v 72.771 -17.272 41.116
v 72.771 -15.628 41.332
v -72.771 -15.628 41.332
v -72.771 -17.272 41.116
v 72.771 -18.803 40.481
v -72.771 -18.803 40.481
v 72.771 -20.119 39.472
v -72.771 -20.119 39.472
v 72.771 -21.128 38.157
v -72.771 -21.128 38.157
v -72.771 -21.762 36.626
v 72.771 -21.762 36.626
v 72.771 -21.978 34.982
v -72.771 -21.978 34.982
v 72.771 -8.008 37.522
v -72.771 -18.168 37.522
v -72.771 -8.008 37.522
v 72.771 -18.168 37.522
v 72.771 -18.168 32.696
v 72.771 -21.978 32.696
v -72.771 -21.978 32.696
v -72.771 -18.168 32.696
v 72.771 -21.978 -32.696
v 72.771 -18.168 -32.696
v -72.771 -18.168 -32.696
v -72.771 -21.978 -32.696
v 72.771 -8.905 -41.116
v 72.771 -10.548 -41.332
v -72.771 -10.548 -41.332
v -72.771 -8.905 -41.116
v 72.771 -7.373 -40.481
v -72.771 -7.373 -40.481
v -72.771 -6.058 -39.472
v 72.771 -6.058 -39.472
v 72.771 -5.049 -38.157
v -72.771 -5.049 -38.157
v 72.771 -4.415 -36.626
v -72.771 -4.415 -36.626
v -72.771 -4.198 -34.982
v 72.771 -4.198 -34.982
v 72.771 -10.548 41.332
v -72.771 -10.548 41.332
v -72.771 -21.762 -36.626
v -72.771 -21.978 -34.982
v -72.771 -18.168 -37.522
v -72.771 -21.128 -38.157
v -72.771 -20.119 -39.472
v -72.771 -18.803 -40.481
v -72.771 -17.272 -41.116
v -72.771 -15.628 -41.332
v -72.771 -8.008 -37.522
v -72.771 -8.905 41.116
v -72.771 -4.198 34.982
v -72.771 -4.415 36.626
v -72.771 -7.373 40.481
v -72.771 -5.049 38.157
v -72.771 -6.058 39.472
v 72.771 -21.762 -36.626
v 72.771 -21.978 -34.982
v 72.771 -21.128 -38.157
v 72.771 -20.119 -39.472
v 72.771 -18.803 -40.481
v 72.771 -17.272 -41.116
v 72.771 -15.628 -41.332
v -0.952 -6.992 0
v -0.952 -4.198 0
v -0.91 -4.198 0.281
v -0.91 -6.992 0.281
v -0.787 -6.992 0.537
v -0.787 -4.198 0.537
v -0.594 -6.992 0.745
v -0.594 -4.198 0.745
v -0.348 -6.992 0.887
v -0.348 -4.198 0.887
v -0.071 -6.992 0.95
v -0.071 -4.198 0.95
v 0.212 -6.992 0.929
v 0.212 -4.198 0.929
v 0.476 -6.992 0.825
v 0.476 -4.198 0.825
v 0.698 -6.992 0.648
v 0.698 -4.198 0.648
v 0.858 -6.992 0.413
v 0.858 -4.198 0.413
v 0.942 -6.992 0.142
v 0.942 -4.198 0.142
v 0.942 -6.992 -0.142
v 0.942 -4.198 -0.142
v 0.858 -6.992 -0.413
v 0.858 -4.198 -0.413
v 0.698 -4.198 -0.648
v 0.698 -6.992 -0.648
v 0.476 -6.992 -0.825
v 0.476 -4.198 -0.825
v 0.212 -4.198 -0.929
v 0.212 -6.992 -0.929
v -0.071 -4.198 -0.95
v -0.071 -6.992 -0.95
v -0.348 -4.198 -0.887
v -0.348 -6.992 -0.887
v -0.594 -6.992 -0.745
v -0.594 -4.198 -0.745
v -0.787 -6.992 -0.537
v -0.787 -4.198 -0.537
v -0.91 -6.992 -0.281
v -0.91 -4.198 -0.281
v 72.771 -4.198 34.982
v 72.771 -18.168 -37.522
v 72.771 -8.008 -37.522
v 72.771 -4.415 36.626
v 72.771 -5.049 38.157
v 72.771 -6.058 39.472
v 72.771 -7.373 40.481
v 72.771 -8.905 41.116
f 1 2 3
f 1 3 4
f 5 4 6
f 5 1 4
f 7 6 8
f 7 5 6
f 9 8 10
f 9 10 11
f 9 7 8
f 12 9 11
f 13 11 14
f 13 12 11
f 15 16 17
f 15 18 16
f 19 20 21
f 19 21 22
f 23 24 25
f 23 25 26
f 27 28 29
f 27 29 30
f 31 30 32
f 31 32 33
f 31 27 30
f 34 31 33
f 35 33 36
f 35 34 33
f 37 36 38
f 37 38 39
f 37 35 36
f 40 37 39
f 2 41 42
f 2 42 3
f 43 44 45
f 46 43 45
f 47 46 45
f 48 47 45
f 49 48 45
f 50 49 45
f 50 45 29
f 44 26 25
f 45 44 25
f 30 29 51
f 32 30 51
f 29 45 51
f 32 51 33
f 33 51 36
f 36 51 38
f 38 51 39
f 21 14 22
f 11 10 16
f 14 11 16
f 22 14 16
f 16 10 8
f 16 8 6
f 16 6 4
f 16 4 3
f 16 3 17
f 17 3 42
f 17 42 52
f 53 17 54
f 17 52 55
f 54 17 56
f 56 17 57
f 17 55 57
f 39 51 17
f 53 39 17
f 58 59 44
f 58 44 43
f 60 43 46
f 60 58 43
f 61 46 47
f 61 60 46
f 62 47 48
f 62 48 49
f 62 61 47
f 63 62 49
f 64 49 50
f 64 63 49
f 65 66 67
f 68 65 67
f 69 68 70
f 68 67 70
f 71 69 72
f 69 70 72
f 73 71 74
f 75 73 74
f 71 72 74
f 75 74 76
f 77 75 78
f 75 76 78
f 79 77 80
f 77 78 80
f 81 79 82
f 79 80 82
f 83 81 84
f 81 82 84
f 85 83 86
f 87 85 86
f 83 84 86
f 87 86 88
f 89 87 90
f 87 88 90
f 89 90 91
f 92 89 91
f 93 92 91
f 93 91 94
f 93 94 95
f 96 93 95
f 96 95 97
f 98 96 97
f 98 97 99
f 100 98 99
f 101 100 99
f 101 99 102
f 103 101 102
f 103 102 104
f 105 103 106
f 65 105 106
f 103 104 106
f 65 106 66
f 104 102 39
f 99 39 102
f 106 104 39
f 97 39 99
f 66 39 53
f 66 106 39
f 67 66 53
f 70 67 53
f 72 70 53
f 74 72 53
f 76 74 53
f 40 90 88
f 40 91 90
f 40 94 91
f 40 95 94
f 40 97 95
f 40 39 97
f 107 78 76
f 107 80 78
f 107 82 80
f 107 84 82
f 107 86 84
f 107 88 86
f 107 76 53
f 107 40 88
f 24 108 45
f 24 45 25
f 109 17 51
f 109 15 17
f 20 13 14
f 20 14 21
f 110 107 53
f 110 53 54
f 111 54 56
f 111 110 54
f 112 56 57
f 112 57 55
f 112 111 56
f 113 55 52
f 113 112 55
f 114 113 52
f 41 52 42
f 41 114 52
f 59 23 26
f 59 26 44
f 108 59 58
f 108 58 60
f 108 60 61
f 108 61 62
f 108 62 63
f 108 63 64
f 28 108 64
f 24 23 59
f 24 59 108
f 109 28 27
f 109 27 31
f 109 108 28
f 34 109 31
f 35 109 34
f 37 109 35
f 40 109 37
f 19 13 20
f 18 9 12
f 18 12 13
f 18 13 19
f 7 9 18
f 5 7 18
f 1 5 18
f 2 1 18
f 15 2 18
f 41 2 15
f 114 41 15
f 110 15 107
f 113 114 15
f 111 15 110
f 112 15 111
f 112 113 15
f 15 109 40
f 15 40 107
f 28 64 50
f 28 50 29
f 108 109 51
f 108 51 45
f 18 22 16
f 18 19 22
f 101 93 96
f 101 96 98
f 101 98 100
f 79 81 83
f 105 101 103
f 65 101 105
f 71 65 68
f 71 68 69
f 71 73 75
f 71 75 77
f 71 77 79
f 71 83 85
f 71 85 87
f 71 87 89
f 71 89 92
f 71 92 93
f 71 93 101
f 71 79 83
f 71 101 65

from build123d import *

# Parameters (mm, degrees)
F1_DEPTH      = 72.771
F1_DEPTH_BACK = 72.771
F2_R          = 0.9525
F3_DEPTH      = 2.794


# Not quite as in the source:
# - a length typed as a fraction of an inch, garbled in the dataset ("3 / 203.2 mm" for 3/8 in), is restored


with BuildPart() as f1:
    # F0 (on Right) → F1 (new body, two sides)
    with BuildSketch(Plane.YZ) as f1_sk:
        with BuildLine():
            Line((-8.008403407, 37.52215), (-8.008403407, 0))
            Line((-8.008403407, 0), (-8.008403407, -37.52215))
            Line((-8.008403407, -37.52215), (-18.168403407, -37.52215))
            Line((-18.168403407, -37.52215), (-18.168403407, -32.69615))
            Line((-18.168403407, -32.69615), (-21.978403407, -32.69615))
            Line((-21.978403407, -32.69615), (-21.978403407, -34.98215))
            ThreePointArc((-21.978403407, -34.98215), (-20.1185314675, -39.4722780605), (-15.628403407, -41.33215))
            Line((-15.628403407, -41.33215), (-10.548403407, -41.33215))
            ThreePointArc((-10.548403407, -41.33215), (-6.0582753465, -39.4722780605), (-4.198403407, -34.98215))
            Line((-4.198403407, -34.98215), (-4.198403407, 0))
            Line((-4.198403407, 0), (-4.198403407, 34.98215))
            ThreePointArc((-4.198403407, 34.98215), (-6.0582753465, 39.4722780605), (-10.548403407, 41.33215))
            Line((-10.548403407, 41.33215), (-15.628403407, 41.33215))
            ThreePointArc((-15.628403407, 41.33215), (-20.1185314675, 39.4722780605), (-21.978403407, 34.98215))
            Line((-21.978403407, 34.98215), (-21.978403407, 32.69615))
            Line((-21.978403407, 32.69615), (-18.168403407, 32.69615))
            Line((-18.168403407, 32.69615), (-18.168403407, 37.52215))
            Line((-18.168403407, 37.52215), (-8.008403407, 37.52215))
        make_face()
    extrude(amount=F1_DEPTH)
    extrude(f1_sk.sketch, amount=-F1_DEPTH_BACK)

    # F2 (on face) → F3 (cut)
    with BuildSketch(Plane(origin=(0, -4.198403407, 0), x_dir=(-1, 0, 0), z_dir=(0, 1, 0))):
        Circle(F2_R)
    extrude(amount=-F3_DEPTH, mode=Mode.SUBTRACT)


solid = f1.part
